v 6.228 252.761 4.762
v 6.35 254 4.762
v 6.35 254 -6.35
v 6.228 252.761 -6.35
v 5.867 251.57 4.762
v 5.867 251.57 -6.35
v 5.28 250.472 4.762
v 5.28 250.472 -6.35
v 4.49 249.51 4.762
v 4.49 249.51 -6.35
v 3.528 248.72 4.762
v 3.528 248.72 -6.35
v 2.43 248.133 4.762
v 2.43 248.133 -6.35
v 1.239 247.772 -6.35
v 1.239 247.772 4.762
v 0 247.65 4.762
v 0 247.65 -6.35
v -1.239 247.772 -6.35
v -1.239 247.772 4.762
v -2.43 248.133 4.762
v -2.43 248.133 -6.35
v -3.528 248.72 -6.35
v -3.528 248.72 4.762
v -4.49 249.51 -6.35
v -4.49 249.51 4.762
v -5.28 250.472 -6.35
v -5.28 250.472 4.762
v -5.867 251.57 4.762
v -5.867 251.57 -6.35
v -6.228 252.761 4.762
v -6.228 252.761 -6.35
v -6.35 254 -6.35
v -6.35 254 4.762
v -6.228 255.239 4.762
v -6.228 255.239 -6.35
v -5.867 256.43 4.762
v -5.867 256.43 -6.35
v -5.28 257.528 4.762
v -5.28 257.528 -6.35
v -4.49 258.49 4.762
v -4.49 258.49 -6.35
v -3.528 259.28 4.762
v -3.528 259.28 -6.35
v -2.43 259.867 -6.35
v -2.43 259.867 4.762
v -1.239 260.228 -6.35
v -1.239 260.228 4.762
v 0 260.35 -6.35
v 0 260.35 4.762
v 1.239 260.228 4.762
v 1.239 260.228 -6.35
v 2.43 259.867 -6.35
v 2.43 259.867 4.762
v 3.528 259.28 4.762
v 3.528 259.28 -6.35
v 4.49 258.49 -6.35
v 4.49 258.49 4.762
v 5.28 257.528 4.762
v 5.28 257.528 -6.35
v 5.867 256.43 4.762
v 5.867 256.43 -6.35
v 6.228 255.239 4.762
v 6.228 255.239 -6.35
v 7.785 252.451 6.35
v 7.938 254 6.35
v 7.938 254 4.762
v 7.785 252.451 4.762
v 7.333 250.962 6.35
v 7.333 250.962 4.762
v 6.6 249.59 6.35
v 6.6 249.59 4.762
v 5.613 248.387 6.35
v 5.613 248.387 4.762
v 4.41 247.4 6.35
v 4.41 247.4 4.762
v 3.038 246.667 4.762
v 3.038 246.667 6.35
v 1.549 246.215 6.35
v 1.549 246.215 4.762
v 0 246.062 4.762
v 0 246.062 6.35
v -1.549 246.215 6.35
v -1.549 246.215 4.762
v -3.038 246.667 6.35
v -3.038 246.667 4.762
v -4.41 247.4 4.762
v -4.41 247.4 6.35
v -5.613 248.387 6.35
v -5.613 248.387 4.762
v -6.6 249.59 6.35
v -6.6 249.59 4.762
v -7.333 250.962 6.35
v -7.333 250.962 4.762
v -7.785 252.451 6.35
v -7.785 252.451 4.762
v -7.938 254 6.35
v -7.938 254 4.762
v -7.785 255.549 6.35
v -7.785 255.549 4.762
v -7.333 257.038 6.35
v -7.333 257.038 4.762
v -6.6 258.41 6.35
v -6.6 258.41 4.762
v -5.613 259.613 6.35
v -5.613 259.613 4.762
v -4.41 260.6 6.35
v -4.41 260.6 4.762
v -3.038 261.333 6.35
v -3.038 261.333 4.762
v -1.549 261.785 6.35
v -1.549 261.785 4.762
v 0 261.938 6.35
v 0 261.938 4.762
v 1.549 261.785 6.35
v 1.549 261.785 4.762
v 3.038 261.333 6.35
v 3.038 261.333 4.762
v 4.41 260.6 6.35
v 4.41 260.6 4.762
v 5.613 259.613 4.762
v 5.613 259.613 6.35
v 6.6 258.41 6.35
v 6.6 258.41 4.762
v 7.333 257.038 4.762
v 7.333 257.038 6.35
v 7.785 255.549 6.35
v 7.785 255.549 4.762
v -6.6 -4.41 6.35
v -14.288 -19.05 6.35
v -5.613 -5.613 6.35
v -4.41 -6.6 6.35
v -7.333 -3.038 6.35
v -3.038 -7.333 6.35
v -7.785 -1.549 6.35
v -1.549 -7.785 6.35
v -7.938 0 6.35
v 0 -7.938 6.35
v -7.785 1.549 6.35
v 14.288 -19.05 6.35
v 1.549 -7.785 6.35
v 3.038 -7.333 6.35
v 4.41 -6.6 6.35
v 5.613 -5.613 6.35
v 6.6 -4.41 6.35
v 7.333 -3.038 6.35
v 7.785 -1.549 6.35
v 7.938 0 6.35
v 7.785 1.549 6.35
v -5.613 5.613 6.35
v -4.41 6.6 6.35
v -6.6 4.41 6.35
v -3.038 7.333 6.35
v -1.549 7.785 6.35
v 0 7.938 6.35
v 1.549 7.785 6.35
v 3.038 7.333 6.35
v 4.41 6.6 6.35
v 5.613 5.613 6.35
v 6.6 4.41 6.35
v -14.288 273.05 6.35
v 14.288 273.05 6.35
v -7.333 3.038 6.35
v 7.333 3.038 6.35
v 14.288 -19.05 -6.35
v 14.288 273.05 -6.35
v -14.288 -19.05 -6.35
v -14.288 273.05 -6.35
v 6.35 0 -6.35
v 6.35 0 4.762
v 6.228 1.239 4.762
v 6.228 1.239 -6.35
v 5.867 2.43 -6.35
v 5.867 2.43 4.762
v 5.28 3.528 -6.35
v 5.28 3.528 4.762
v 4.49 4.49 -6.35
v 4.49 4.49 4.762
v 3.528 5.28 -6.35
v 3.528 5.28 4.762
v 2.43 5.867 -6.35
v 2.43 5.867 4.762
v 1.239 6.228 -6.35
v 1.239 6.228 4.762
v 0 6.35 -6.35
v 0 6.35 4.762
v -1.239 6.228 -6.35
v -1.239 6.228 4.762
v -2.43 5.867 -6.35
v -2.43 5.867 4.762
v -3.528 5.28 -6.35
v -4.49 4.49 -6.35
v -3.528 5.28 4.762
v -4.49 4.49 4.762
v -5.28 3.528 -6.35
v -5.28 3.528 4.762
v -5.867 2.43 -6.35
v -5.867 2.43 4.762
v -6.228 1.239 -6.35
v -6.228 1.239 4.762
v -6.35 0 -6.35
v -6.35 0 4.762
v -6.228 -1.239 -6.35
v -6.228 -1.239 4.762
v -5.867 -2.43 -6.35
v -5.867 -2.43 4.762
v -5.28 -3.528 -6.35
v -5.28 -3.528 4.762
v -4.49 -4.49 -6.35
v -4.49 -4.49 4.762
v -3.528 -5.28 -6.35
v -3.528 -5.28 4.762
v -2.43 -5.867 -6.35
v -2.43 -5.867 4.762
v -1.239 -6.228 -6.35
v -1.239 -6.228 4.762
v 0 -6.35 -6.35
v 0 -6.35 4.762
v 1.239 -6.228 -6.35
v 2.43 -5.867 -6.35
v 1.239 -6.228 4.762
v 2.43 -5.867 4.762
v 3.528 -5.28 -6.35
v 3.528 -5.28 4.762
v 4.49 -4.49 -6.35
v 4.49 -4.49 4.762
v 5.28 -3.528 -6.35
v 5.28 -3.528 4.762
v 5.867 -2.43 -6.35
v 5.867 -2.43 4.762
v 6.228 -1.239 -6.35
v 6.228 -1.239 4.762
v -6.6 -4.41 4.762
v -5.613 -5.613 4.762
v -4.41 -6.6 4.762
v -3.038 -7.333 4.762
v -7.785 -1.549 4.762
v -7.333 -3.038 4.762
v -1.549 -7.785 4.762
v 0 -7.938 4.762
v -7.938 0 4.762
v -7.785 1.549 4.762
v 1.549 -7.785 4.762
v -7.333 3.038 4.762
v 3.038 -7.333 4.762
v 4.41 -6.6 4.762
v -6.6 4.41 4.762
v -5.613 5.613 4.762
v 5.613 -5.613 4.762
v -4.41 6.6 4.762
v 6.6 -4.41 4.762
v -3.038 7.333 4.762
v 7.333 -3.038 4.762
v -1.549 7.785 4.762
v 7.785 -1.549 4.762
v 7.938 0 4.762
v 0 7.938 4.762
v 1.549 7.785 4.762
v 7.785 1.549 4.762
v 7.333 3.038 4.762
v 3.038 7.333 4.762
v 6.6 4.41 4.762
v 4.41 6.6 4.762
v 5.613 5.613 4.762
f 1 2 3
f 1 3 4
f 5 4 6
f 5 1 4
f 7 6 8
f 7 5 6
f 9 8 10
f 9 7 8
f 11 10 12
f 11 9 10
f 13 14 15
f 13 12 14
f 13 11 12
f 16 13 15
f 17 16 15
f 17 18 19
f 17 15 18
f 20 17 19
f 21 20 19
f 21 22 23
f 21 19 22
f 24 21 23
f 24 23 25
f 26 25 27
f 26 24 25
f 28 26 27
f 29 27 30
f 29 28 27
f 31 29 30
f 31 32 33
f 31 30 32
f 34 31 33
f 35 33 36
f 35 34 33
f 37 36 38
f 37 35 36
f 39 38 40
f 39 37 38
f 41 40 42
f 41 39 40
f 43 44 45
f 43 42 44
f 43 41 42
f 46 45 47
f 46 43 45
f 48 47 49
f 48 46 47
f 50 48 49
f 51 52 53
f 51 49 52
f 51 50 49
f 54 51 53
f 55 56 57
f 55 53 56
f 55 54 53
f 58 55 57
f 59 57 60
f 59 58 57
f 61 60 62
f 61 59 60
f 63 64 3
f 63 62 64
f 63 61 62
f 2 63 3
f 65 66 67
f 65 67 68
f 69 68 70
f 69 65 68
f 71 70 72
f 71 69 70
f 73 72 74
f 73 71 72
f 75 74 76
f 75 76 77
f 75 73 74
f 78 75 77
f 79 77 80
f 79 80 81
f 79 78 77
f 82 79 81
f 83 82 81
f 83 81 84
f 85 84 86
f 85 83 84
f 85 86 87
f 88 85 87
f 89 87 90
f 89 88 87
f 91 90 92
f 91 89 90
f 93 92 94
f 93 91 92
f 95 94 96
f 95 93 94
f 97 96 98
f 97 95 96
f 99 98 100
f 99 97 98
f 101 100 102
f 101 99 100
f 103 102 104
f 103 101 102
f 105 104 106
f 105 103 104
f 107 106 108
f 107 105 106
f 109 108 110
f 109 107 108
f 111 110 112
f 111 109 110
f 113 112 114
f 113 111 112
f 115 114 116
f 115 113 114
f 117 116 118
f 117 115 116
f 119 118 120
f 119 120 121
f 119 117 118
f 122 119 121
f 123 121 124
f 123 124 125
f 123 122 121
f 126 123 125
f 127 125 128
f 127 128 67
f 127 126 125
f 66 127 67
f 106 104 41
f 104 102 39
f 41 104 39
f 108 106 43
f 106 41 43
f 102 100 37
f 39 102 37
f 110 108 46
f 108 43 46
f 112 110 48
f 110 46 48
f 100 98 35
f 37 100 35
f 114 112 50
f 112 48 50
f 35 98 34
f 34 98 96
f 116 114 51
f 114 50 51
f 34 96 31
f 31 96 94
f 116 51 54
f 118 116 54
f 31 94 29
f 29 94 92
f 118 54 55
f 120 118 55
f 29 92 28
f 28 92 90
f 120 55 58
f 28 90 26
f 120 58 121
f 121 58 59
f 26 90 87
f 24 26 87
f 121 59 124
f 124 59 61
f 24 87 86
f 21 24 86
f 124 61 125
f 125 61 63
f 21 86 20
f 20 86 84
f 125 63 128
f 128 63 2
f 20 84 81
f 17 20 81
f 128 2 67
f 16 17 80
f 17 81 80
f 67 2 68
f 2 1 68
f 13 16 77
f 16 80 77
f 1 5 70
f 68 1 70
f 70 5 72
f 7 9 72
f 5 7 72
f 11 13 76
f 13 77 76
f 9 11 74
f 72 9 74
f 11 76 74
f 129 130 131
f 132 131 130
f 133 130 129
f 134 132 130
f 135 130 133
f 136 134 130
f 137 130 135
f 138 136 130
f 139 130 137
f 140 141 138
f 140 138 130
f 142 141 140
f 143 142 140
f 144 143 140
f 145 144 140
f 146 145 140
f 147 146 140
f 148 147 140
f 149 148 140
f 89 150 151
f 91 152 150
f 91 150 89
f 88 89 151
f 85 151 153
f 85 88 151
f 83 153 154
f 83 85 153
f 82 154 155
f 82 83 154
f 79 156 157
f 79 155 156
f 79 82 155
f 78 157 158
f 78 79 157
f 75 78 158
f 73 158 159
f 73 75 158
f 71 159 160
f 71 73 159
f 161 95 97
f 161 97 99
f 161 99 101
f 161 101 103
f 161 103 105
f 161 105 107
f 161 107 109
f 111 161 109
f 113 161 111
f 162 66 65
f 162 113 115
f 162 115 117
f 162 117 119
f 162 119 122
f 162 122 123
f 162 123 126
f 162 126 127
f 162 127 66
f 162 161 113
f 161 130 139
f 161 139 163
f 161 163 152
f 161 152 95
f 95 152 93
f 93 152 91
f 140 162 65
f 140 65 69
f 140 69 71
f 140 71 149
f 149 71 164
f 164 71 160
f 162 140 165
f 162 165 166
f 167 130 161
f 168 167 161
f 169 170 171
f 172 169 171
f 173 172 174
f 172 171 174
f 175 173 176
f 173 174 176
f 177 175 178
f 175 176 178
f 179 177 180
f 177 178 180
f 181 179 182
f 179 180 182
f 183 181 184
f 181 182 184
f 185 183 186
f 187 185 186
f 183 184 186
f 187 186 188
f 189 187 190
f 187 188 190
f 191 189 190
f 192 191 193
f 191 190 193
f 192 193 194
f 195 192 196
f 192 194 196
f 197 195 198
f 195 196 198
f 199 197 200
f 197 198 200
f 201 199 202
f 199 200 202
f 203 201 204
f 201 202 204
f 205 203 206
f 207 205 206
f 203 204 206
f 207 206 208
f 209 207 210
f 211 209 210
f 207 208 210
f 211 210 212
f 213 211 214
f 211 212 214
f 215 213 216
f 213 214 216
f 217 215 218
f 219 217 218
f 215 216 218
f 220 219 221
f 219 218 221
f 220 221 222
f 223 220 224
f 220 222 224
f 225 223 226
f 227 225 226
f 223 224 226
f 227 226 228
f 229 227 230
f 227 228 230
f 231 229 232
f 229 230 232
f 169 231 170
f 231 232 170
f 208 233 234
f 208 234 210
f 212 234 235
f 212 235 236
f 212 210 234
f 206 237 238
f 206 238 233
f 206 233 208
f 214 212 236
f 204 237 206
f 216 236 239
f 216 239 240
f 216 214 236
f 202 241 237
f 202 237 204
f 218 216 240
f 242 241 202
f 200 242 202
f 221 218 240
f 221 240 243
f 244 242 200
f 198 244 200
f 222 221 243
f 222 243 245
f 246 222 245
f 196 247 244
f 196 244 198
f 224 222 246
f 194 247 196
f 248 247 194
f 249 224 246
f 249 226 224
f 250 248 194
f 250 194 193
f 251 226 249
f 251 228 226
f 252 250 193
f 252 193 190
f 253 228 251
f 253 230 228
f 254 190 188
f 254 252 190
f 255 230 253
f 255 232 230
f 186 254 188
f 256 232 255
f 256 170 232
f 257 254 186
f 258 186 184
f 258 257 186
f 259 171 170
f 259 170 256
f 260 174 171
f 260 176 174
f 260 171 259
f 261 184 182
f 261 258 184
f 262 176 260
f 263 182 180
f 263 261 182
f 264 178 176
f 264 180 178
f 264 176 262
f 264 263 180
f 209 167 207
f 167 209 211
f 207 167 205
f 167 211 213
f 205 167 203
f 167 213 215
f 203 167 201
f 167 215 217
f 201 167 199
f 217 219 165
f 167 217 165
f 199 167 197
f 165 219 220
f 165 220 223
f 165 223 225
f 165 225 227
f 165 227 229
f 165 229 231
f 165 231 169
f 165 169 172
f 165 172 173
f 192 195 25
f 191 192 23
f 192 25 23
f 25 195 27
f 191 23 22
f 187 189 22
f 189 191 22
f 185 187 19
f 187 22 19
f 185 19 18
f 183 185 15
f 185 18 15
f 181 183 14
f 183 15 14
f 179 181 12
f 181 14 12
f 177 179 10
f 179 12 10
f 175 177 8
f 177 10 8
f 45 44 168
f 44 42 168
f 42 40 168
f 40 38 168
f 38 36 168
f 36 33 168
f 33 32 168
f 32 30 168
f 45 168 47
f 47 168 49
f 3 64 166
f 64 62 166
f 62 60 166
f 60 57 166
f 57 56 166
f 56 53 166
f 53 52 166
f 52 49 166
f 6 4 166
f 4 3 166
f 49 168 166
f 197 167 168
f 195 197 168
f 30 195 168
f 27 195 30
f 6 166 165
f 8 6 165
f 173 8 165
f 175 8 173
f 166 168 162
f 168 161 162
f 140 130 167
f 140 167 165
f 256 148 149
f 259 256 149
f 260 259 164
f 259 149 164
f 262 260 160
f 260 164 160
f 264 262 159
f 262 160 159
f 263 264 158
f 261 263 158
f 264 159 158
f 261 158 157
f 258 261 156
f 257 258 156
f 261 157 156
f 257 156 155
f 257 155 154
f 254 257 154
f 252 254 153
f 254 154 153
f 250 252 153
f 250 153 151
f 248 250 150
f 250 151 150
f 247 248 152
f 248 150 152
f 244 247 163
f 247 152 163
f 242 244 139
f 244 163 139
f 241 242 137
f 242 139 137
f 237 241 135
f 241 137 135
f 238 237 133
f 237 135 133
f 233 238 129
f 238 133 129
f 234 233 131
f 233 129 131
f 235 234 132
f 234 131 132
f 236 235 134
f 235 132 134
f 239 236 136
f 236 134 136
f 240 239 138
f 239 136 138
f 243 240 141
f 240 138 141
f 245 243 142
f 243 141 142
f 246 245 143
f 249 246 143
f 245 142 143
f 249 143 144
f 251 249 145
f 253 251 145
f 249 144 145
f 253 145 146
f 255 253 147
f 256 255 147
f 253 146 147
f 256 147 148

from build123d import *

# Parameters (mm, degrees)
SKETCH2_W           = 28.575
SKETCH2_H           = 292.1
BOSS_EXTRUDE1_DEPTH = 6.35
SKETCH4_R           = 6.35
CUT_EXTRUDE1_DEPTH  = 7.35
SKETCH5_R           = 7.9375
CUT_EXTRUDE2_DEPTH  = 1.5875


with BuildPart() as part:
    # Sketch2 → Boss-Extrude1 (new body, symmetric)
    with BuildSketch(Plane.XY):
        with Locations((0, 127)):
            Rectangle(SKETCH2_W, SKETCH2_H)
    extrude(amount=BOSS_EXTRUDE1_DEPTH, both=True)

    # Sketch4 → Cut-Extrude1 (cut, symmetric)
    with BuildSketch(Plane.XY):
        Circle(SKETCH4_R)
    cut_extrude1 = extrude(amount=CUT_EXTRUDE1_DEPTH, both=True, mode=Mode.SUBTRACT)

    # Sketch5 → Cut-Extrude2 (cut)
    with BuildSketch(Plane.XY.offset(6.35)):
        Circle(SKETCH5_R)
    cut_extrude2 = extrude(amount=-CUT_EXTRUDE2_DEPTH, mode=Mode.SUBTRACT)

    # Mirror1: Cut-Extrude1, Cut-Extrude2 across plane
    add(cut_extrude1.mirror(Plane(origin=(0, 127, 0), x_dir=(0, 0, 1), z_dir=(0, -1, 0))), mode=Mode.SUBTRACT)
    add(cut_extrude2.mirror(Plane(origin=(0, 127, 0), x_dir=(0, 0, 1), z_dir=(0, -1, 0))), mode=Mode.SUBTRACT)


solid = part.part
